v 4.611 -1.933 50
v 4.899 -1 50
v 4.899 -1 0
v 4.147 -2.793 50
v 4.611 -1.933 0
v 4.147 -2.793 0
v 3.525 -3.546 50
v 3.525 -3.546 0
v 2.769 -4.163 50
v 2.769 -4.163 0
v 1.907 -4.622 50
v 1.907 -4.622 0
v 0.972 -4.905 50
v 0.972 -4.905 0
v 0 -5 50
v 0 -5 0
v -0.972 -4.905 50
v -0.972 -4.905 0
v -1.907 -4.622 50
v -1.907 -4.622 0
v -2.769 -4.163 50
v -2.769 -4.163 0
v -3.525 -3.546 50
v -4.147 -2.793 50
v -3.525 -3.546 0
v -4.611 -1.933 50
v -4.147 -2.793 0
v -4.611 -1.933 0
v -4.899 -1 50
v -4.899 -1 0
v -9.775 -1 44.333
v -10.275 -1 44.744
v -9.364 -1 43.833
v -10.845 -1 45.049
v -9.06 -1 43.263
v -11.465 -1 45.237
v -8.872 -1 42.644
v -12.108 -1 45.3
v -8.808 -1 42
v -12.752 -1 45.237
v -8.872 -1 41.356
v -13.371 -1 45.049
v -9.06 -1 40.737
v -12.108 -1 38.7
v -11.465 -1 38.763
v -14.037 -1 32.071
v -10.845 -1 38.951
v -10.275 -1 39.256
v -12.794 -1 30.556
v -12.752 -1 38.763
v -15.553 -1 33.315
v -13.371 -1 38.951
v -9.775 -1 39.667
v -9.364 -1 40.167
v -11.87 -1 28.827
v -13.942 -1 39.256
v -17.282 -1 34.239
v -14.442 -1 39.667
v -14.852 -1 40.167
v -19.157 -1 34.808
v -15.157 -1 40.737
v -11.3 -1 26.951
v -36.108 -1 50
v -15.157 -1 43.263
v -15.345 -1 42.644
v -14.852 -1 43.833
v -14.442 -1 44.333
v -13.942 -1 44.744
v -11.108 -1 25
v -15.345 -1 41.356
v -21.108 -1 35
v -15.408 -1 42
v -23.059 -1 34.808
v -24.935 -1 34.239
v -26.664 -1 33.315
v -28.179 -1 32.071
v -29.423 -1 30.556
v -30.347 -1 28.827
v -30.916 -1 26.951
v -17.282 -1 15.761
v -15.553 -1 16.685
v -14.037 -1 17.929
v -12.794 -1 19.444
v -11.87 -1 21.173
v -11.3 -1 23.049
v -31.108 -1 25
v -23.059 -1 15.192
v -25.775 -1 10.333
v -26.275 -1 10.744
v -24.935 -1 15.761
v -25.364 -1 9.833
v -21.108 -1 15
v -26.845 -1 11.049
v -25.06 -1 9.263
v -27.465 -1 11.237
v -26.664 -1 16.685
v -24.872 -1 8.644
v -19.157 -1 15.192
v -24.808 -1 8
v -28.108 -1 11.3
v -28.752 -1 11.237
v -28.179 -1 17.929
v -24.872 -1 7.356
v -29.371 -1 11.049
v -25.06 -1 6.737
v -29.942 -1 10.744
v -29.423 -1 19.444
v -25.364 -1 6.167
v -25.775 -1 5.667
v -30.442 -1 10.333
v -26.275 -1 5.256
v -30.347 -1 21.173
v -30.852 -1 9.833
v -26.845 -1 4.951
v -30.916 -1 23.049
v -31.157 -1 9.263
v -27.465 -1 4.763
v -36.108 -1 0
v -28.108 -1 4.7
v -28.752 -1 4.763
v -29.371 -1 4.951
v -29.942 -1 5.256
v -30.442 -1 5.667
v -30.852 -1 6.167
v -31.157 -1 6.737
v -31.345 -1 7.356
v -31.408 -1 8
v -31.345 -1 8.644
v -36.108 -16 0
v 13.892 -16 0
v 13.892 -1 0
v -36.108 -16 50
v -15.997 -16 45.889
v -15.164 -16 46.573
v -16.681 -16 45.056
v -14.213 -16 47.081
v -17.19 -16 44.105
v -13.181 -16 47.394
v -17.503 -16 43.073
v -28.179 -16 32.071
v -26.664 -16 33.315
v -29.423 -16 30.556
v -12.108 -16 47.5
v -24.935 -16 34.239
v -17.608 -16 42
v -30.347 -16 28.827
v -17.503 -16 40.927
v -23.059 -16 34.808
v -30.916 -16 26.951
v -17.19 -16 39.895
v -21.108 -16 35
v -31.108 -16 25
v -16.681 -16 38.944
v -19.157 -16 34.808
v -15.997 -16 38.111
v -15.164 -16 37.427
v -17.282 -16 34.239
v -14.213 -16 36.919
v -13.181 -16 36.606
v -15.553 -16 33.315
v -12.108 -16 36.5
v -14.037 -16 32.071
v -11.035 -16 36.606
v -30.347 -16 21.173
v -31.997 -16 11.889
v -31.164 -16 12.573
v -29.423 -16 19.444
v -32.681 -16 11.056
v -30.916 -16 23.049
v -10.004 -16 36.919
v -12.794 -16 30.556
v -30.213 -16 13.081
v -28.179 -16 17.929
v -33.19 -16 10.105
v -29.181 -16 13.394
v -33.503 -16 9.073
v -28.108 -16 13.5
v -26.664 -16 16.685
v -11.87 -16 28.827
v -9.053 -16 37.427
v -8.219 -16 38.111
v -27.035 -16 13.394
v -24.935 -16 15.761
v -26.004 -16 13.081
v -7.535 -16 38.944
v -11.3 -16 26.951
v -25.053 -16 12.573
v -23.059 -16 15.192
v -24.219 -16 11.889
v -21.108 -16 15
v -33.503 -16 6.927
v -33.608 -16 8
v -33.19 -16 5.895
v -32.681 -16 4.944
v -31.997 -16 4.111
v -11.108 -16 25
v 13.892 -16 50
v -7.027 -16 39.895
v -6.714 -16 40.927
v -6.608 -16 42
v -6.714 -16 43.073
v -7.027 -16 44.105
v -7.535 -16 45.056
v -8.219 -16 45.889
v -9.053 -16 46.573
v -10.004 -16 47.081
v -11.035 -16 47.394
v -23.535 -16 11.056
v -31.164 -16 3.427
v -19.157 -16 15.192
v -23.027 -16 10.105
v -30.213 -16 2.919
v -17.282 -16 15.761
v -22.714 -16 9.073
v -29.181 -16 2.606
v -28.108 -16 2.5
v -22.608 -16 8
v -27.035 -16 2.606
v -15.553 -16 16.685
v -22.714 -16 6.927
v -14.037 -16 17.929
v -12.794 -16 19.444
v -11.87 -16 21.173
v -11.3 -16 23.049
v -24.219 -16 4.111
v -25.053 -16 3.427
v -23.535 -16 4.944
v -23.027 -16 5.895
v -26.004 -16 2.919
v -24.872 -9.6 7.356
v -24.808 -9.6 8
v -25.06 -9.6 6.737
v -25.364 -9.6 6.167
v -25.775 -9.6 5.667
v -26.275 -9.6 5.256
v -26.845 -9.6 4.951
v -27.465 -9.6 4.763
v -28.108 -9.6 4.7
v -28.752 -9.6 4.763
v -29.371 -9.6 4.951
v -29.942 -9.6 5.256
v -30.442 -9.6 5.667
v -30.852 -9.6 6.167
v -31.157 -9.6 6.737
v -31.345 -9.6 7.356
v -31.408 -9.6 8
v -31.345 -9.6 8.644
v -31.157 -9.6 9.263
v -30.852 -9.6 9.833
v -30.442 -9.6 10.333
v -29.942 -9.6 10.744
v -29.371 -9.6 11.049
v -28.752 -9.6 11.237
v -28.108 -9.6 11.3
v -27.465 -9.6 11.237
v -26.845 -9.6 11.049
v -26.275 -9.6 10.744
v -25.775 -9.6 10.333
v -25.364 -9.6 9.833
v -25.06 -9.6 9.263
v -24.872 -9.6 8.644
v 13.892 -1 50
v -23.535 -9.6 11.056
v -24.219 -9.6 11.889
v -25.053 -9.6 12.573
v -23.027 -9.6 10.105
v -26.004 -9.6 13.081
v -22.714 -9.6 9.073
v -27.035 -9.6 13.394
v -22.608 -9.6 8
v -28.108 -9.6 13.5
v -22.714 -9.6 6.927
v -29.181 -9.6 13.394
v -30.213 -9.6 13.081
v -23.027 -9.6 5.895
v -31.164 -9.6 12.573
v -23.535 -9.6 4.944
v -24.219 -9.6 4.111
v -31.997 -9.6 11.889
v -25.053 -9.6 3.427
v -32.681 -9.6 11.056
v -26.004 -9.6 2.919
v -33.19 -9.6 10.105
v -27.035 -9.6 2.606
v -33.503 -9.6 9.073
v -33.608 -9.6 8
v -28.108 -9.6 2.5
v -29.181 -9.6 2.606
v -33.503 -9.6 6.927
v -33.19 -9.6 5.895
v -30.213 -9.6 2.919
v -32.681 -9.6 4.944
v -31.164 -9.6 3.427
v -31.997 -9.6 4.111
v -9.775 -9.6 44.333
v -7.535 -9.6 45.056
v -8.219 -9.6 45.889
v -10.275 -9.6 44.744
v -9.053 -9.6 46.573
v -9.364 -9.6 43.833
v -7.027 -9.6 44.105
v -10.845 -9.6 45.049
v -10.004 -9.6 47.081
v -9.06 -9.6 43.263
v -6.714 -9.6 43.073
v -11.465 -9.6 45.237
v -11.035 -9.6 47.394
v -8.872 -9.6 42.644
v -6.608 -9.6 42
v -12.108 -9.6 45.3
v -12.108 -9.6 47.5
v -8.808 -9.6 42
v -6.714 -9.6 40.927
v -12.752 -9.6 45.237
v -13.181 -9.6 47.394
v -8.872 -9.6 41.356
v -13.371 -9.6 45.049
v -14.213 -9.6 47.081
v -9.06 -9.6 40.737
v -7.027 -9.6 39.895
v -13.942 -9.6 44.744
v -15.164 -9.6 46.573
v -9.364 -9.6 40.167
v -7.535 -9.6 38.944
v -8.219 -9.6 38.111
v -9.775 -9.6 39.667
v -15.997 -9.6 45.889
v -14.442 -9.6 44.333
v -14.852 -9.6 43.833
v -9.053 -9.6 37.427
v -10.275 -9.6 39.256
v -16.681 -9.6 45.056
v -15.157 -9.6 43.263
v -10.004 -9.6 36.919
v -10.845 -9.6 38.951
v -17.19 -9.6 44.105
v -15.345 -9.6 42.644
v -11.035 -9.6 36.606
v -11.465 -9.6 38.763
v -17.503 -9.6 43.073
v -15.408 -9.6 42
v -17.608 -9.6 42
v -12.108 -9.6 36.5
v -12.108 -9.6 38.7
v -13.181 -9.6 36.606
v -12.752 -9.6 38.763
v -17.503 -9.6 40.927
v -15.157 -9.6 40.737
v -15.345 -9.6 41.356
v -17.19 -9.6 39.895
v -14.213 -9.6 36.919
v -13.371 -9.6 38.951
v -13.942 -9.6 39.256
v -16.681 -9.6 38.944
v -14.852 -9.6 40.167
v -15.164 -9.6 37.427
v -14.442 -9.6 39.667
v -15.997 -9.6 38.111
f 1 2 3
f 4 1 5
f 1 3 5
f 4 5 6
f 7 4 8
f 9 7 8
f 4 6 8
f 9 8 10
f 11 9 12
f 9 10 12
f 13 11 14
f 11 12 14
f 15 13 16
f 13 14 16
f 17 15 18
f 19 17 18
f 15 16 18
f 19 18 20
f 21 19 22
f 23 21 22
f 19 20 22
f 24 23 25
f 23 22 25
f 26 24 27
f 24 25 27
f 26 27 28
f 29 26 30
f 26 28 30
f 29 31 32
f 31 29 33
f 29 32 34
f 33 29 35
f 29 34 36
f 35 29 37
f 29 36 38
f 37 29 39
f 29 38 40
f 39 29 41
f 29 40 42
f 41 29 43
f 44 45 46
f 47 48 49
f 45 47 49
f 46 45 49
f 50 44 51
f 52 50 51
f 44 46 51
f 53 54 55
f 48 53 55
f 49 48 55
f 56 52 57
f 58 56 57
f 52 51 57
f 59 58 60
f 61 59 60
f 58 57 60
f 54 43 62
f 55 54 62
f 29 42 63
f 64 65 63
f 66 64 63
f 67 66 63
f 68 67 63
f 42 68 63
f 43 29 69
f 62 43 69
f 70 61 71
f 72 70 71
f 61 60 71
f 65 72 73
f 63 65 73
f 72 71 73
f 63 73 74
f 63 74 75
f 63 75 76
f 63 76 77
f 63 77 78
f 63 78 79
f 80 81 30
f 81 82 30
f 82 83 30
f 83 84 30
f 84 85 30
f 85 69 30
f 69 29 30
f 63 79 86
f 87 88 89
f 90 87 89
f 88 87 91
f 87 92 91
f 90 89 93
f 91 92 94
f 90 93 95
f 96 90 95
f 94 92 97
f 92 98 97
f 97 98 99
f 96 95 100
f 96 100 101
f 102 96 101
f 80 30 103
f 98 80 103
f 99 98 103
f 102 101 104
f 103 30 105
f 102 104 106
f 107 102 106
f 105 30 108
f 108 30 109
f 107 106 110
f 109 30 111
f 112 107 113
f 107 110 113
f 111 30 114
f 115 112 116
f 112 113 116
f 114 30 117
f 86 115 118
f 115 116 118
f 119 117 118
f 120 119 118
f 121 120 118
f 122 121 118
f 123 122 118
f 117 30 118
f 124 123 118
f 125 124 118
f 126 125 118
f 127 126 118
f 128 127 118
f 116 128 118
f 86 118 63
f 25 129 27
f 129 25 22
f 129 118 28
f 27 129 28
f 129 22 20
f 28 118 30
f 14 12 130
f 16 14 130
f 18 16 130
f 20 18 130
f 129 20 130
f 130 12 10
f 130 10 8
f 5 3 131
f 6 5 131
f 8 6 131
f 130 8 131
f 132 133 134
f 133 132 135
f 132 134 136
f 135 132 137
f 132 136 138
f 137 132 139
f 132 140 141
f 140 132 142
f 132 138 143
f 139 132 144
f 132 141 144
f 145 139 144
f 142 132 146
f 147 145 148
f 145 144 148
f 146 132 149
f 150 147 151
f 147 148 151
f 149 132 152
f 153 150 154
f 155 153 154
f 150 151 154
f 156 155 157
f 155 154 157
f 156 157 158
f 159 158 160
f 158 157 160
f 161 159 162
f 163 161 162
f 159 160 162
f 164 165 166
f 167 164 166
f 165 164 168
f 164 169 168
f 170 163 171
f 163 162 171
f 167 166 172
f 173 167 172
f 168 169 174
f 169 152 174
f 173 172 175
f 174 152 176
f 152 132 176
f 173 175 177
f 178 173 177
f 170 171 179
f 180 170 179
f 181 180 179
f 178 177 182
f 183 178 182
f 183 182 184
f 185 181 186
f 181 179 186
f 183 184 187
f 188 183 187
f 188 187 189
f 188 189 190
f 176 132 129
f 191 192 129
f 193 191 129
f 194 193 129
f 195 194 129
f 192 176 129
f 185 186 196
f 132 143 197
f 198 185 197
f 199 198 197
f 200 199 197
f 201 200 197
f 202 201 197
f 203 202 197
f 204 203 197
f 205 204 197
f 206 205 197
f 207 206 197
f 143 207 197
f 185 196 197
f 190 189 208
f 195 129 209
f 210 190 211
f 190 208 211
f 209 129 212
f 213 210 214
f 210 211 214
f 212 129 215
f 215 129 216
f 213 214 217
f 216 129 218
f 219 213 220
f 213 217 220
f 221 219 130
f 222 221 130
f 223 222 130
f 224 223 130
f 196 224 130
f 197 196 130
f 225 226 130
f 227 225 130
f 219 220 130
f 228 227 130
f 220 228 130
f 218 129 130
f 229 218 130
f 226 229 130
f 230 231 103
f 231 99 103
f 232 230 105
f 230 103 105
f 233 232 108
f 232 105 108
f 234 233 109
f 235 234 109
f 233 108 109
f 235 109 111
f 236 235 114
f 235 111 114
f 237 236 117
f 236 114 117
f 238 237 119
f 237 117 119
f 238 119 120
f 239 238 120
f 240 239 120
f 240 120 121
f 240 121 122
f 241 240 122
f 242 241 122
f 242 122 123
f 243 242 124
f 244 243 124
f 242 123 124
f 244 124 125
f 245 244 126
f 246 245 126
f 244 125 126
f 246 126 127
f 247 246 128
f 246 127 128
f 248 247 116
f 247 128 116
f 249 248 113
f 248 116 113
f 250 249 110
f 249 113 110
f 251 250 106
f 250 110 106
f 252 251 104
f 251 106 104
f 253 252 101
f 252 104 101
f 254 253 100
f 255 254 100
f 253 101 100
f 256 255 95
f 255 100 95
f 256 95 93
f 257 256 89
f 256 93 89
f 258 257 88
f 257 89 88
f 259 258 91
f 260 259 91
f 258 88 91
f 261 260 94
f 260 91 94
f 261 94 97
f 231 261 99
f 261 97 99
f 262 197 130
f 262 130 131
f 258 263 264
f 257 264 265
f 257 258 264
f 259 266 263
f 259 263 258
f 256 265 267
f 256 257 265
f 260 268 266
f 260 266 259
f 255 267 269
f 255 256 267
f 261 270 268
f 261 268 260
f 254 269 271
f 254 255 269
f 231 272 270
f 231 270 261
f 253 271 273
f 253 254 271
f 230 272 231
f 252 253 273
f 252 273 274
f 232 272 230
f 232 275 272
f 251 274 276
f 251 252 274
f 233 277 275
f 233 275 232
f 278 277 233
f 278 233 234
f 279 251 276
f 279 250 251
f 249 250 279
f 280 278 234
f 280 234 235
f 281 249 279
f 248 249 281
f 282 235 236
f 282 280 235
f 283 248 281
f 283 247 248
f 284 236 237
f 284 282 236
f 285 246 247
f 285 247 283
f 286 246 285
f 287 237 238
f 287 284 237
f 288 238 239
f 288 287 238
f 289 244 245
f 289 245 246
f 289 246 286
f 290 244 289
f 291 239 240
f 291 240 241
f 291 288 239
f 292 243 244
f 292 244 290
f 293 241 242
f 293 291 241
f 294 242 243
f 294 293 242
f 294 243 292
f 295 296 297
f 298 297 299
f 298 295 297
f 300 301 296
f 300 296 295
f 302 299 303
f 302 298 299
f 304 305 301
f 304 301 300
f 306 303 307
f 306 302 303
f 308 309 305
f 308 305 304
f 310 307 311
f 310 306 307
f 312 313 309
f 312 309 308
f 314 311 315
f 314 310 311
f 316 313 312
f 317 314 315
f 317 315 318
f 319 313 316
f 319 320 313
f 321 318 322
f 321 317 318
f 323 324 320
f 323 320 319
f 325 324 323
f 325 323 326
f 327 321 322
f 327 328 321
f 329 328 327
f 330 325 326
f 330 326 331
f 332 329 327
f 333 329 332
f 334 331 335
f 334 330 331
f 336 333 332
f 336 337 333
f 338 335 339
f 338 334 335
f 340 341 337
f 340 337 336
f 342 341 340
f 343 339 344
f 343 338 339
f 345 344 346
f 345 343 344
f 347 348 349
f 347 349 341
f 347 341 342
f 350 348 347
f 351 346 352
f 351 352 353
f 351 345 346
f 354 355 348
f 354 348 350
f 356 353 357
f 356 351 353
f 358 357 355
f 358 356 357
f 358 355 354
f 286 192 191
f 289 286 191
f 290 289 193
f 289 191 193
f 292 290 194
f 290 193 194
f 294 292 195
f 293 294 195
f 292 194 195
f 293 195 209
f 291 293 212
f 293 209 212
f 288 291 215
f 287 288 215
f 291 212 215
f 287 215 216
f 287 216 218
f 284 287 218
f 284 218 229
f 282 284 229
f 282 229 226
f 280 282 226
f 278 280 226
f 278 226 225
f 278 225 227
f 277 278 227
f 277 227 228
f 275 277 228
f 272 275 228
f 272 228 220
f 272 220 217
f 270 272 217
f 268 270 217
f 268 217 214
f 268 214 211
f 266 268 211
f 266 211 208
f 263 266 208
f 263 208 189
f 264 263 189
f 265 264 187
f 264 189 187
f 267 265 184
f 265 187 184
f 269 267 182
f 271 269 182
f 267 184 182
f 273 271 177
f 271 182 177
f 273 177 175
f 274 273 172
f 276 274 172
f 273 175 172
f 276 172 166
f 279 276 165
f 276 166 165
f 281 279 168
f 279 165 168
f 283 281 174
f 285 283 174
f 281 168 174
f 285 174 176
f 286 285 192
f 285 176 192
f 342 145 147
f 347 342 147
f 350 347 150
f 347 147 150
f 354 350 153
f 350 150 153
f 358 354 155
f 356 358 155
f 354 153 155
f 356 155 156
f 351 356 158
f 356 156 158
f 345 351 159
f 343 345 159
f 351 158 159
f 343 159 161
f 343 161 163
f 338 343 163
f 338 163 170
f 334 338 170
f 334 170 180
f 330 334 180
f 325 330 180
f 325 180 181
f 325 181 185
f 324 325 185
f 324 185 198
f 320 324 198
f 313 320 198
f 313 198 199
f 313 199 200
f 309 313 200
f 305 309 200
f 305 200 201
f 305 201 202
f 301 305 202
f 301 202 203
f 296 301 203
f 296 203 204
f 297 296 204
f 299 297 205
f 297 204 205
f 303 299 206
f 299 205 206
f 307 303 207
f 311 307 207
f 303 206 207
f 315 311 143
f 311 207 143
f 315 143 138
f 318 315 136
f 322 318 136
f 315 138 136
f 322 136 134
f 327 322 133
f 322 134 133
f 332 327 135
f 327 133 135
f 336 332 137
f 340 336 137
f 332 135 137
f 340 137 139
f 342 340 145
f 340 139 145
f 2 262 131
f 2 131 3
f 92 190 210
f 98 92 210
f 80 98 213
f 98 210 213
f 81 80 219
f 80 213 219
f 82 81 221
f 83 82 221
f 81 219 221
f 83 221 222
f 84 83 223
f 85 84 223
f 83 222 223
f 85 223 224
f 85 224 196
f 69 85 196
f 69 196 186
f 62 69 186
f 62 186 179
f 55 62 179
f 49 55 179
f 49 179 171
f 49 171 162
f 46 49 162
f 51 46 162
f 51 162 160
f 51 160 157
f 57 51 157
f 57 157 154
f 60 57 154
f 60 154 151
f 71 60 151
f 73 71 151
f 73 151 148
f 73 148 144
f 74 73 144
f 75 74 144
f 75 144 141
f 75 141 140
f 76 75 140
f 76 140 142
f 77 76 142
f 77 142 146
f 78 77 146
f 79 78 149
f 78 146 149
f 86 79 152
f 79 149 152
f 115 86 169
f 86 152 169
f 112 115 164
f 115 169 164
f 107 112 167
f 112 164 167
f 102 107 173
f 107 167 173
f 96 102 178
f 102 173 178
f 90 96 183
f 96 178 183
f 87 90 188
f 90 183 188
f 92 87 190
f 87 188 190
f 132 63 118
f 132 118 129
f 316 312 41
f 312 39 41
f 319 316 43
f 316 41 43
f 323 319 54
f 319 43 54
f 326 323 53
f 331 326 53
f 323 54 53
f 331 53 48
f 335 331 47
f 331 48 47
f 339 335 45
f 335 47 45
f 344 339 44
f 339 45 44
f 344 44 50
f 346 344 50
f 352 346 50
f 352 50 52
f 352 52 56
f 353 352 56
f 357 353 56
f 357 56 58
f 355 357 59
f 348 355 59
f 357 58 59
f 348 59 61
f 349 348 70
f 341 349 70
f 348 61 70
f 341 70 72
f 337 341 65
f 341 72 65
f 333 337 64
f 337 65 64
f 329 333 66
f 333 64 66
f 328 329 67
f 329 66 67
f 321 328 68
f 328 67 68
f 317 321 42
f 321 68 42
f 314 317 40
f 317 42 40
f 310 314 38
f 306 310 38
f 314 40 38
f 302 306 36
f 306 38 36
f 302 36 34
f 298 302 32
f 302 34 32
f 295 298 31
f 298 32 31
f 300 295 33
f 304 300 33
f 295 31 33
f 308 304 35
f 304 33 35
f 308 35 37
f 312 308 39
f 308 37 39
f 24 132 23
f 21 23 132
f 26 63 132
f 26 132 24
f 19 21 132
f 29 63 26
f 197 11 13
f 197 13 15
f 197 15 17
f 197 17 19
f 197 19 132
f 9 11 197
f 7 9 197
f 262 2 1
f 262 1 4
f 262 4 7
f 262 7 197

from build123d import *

# Parameters (mm, degrees)
BOSS_EXTRU_1_DEPTH                                 = 50
CHAMBRAGE_POUR_VIS_T_TE_HEXAGONALE_M62_D           = 6.6
CHAMBRAGE_POUR_VIS_T_TE_HEXAGONALE_M62_CBORE_D     = 11
CHAMBRAGE_POUR_VIS_T_TE_HEXAGONALE_M62_CBORE_DEPTH = 6.4
ESQUISSE5_R                                        = 10
ENL_V_MAT_EXTRU_1_DEPTH                            = 64.472923802


with BuildPart() as part:
    # Esquisse1 → Boss.-Extru.1 (new body)
    with BuildSketch(Plane.XY):
        with BuildLine():
            Line((-36.108337762, -1), (-36.108337762, -16))
            Line((-36.108337762, -16), (13.891662238, -16))
            Line((13.891662238, -16), (13.891662238, -1))
            Line((13.891662238, -1), (4.898979486, -1))
            ThreePointArc((4.898979486, -1), (0, -5), (-4.898979486, -1))
            Line((-4.898979486, -1), (-36.108337762, -1))
        make_face()
    extrude(amount=BOSS_EXTRU_1_DEPTH)

    # Chambrage pour vis à tête hexagonale M62 (through all)
    with Locations(Plane(origin=(0, -16, 0), x_dir=(-1, 0, 0), z_dir=(0, -1, 0))):
        with Locations((12.108337762, -42), (28.108337762, -8)):
            CounterBoreHole(CHAMBRAGE_POUR_VIS_T_TE_HEXAGONALE_M62_D / 2, CHAMBRAGE_POUR_VIS_T_TE_HEXAGONALE_M62_CBORE_D / 2, CHAMBRAGE_POUR_VIS_T_TE_HEXAGONALE_M62_CBORE_DEPTH)

    # Esquisse5 → Enlèv. mat.-Extru.1 (cut, through all)
    with BuildSketch(Plane(origin=(0, -16, 0), x_dir=(-1, 0, 0), z_dir=(0, -1, 0))):
        with Locations(Location((21.108337762, -25, 0), (0, 0, 90))):
            Circle(ESQUISSE5_R)
    extrude(amount=-ENL_V_MAT_EXTRU_1_DEPTH, mode=Mode.SUBTRACT)


solid = part.part
